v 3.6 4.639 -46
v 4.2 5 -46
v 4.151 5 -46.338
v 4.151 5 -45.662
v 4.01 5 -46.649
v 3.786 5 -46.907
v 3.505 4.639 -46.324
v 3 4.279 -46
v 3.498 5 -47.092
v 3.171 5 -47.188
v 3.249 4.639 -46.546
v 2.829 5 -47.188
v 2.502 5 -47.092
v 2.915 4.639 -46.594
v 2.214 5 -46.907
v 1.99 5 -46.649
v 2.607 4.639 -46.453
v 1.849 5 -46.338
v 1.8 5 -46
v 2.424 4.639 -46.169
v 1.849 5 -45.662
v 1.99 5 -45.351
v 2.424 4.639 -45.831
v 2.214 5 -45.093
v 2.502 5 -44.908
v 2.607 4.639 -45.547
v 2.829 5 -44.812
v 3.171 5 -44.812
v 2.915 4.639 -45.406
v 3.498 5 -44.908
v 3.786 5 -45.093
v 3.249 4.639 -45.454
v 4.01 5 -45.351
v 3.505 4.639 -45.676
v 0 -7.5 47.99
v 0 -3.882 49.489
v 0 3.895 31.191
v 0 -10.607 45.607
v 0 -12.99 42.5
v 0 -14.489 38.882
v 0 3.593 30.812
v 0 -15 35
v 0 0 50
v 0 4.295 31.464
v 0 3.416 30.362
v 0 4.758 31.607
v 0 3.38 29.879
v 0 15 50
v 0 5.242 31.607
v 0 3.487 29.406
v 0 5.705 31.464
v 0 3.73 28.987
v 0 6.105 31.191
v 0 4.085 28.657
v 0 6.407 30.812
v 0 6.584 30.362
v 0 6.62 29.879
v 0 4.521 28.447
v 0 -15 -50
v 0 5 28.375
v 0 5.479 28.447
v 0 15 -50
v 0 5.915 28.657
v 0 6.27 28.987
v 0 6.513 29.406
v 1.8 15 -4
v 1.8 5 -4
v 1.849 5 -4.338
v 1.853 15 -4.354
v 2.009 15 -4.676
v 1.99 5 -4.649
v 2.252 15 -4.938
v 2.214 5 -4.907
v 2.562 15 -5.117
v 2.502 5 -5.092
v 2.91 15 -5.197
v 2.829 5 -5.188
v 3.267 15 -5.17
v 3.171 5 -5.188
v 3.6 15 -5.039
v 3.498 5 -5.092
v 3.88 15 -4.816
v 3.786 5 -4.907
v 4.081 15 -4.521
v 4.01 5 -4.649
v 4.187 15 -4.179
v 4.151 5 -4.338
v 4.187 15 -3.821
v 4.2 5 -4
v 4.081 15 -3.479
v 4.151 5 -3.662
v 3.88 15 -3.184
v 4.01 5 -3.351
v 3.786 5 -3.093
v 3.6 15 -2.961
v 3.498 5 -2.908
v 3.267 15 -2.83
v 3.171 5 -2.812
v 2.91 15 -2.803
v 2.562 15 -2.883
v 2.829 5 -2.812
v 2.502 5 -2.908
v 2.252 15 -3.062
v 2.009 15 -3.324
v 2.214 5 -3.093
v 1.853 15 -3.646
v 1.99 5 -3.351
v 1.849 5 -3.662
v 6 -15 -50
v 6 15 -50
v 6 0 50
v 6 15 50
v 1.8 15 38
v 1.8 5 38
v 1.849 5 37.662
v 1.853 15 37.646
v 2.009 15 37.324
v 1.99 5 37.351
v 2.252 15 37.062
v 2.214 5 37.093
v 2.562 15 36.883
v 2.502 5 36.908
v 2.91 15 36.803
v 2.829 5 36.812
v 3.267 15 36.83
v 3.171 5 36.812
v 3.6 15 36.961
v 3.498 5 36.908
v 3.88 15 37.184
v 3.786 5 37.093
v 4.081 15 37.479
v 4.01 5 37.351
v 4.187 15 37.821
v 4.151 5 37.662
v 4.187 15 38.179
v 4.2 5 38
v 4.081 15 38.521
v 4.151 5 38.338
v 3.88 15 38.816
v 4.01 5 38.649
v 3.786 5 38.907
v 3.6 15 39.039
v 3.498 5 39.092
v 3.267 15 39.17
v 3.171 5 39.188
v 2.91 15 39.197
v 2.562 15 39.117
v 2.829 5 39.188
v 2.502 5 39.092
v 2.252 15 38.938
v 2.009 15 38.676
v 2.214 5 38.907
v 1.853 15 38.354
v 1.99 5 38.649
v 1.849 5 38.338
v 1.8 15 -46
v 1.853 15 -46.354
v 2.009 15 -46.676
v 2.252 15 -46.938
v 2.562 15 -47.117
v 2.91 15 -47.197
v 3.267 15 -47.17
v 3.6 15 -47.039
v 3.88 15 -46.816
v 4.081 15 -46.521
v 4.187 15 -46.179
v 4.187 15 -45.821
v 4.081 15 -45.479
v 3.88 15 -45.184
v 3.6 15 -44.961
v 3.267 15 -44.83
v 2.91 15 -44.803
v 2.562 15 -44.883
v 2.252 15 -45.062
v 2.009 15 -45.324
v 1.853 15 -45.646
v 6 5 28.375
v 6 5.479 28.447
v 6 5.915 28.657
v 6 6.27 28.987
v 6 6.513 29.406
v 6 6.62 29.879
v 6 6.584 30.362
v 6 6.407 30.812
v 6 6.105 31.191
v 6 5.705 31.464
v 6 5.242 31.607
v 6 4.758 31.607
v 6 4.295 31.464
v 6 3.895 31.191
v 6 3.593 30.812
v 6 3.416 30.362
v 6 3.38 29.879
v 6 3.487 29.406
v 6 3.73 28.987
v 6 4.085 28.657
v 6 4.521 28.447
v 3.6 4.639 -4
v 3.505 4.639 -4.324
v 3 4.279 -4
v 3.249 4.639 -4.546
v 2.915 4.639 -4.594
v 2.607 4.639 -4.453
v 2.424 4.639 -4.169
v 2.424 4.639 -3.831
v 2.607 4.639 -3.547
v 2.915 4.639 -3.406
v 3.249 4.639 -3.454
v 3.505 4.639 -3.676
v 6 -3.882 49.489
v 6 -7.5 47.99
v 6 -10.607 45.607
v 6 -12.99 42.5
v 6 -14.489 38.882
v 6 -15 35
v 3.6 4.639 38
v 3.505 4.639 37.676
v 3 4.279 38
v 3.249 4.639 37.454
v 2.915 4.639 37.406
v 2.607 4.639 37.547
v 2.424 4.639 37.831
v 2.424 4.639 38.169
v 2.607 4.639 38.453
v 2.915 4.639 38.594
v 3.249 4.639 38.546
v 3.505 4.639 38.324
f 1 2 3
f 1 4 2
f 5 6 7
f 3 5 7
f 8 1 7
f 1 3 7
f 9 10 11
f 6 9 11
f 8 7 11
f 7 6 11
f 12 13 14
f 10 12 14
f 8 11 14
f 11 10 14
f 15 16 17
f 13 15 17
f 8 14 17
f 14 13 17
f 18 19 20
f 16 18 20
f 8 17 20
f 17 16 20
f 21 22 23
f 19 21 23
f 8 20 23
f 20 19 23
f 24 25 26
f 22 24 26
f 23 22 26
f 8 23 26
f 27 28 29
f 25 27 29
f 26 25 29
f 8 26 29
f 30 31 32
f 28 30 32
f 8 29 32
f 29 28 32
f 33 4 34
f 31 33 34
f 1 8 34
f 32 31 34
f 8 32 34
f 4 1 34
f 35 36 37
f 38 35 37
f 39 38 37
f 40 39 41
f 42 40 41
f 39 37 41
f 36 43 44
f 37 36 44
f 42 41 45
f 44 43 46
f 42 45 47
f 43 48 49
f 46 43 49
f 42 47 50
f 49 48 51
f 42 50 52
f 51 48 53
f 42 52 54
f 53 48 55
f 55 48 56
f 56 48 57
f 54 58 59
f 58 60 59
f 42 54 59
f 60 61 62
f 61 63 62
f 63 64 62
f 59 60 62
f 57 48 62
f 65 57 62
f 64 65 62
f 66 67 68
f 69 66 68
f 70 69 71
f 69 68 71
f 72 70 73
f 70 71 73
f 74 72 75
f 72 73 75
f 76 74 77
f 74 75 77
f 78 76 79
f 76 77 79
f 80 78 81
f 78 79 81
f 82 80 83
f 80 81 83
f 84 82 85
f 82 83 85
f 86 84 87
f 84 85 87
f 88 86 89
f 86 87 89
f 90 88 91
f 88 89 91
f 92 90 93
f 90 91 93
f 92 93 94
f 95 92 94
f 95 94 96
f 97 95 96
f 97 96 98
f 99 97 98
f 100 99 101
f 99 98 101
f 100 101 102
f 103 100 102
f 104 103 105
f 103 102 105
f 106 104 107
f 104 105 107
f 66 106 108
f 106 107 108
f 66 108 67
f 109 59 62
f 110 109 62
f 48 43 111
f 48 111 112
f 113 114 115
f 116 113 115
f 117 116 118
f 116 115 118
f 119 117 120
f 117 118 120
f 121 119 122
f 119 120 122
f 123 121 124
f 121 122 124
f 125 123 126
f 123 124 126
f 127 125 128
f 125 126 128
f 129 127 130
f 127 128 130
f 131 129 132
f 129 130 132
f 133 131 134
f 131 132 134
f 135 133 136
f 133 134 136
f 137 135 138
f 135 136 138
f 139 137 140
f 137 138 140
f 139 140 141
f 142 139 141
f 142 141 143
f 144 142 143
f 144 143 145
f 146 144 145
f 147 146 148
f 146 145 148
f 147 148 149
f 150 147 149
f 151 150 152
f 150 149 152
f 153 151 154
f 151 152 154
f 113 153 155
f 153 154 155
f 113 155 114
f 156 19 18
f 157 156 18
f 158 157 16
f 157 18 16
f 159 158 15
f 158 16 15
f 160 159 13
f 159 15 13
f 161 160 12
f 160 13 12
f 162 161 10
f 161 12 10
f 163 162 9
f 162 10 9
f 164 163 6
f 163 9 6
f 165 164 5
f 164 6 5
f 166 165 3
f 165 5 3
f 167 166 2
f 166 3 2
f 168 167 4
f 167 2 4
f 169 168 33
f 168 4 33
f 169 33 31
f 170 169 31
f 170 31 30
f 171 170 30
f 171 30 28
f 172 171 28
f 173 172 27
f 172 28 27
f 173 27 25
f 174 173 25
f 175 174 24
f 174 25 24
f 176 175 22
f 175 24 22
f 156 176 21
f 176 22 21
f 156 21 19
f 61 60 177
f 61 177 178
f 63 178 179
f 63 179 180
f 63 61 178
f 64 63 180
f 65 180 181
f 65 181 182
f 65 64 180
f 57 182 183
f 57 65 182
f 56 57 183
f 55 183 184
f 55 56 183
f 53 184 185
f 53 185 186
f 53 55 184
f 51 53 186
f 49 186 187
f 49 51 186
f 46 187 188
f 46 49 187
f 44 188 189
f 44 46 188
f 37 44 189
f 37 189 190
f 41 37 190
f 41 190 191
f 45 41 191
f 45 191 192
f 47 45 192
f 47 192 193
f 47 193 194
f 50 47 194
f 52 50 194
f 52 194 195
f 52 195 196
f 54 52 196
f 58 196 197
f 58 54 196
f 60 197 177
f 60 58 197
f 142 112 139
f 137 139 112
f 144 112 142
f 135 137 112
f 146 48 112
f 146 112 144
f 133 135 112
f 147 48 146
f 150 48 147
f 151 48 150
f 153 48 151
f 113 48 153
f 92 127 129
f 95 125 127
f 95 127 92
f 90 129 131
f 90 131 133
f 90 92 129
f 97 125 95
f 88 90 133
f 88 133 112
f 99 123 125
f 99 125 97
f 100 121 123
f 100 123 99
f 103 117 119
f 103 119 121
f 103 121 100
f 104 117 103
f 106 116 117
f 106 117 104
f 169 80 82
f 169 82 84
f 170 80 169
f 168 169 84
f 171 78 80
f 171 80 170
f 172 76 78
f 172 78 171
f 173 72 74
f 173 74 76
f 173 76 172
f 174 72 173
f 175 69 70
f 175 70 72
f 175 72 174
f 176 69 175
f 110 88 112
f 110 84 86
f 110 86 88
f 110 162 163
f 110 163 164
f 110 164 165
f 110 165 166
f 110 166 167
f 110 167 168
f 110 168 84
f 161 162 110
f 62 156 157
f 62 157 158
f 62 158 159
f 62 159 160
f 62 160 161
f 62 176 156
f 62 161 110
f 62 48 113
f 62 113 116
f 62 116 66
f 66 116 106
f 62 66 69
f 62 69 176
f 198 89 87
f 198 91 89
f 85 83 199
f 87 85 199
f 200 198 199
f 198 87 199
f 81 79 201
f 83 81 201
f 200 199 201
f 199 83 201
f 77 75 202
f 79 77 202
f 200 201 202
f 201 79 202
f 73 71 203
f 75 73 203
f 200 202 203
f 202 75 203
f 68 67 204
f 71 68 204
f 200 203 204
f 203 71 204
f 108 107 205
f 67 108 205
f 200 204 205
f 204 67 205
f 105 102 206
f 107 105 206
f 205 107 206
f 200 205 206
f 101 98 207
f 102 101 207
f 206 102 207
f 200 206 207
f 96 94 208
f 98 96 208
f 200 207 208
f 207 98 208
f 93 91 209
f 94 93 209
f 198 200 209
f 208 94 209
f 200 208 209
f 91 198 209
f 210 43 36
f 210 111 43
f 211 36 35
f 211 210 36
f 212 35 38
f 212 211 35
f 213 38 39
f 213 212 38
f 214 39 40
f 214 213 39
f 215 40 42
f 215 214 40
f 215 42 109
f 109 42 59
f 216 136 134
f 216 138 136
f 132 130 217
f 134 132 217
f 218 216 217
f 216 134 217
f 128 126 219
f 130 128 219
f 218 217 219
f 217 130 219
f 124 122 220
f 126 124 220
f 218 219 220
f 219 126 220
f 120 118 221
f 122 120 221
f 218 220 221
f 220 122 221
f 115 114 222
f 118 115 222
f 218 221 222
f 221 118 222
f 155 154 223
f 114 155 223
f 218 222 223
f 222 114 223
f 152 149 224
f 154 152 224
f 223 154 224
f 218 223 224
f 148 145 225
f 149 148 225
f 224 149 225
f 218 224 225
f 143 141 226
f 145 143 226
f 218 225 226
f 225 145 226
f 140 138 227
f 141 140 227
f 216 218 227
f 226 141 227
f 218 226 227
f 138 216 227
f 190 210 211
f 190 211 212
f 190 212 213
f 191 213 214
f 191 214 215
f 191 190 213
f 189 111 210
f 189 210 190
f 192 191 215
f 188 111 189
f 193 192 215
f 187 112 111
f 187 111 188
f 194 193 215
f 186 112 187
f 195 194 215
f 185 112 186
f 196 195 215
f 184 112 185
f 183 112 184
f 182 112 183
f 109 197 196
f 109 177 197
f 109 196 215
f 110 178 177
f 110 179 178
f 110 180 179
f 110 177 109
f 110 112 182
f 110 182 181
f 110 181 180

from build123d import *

# Parameters (mm, degrees)
SKETCH1_W                      = 100
SKETCH1_H                      = 30
SKETCH1_R                      = 1.625
BOSS_EXTRUDE1_DEPTH            = 6
FILLET1_R                      = 15
CBORE_FOR_M2_SHCS1_D           = 2.4
CBORE_FOR_M2_SHCS1_DEPTH       = 20
CBORE_FOR_M2_SHCS1_CBORE_D     = 4.4
CBORE_FOR_M2_SHCS1_CBORE_DEPTH = 2
CBORE_FOR_M2_SHCS1_TIP         = 0.721032743


with BuildPart() as part:
    # Sketch1 → Boss-Extrude1 (new body)
    with BuildSketch(Plane(origin=(0, 0, 0), x_dir=(0, 0, -1), z_dir=(1, 0, 0))):
        Rectangle(SKETCH1_W, SKETCH1_H)
        with Locations((-30, 5)):
            Circle(SKETCH1_R, mode=Mode.SUBTRACT)
    extrude(amount=BOSS_EXTRUDE1_DEPTH)

    # Fillet1
    fillet1_edges = [part.edges().sort_by_distance(p)[0] for p in [
        (3, -15, 50),
    ]]
    fillet(fillet1_edges, radius=FILLET1_R)

    # CBORE for M2 SHCS1
    with Locations(Plane(origin=(-622.293536786, 25, -1323.282701689), x_dir=(1, 0, 0), z_dir=(0, 1, 0))):
        with Locations((727.293536786, -1277.282701689), (727.293536786, -1361.282701689), (625.293536786, -1277.282701689), (625.293536786, -1361.282701689), (625.293536786, -1319.282701689), (727.293536786, -1319.282701689)):
            CounterBoreHole(CBORE_FOR_M2_SHCS1_D / 2, CBORE_FOR_M2_SHCS1_CBORE_D / 2, CBORE_FOR_M2_SHCS1_CBORE_DEPTH, depth=CBORE_FOR_M2_SHCS1_DEPTH)
            with Locations((0, 0, -(CBORE_FOR_M2_SHCS1_DEPTH + CBORE_FOR_M2_SHCS1_TIP / 2))):  # 118° drill point
                Cone(0, CBORE_FOR_M2_SHCS1_D / 2, CBORE_FOR_M2_SHCS1_TIP, mode=Mode.SUBTRACT)


solid = part.part
